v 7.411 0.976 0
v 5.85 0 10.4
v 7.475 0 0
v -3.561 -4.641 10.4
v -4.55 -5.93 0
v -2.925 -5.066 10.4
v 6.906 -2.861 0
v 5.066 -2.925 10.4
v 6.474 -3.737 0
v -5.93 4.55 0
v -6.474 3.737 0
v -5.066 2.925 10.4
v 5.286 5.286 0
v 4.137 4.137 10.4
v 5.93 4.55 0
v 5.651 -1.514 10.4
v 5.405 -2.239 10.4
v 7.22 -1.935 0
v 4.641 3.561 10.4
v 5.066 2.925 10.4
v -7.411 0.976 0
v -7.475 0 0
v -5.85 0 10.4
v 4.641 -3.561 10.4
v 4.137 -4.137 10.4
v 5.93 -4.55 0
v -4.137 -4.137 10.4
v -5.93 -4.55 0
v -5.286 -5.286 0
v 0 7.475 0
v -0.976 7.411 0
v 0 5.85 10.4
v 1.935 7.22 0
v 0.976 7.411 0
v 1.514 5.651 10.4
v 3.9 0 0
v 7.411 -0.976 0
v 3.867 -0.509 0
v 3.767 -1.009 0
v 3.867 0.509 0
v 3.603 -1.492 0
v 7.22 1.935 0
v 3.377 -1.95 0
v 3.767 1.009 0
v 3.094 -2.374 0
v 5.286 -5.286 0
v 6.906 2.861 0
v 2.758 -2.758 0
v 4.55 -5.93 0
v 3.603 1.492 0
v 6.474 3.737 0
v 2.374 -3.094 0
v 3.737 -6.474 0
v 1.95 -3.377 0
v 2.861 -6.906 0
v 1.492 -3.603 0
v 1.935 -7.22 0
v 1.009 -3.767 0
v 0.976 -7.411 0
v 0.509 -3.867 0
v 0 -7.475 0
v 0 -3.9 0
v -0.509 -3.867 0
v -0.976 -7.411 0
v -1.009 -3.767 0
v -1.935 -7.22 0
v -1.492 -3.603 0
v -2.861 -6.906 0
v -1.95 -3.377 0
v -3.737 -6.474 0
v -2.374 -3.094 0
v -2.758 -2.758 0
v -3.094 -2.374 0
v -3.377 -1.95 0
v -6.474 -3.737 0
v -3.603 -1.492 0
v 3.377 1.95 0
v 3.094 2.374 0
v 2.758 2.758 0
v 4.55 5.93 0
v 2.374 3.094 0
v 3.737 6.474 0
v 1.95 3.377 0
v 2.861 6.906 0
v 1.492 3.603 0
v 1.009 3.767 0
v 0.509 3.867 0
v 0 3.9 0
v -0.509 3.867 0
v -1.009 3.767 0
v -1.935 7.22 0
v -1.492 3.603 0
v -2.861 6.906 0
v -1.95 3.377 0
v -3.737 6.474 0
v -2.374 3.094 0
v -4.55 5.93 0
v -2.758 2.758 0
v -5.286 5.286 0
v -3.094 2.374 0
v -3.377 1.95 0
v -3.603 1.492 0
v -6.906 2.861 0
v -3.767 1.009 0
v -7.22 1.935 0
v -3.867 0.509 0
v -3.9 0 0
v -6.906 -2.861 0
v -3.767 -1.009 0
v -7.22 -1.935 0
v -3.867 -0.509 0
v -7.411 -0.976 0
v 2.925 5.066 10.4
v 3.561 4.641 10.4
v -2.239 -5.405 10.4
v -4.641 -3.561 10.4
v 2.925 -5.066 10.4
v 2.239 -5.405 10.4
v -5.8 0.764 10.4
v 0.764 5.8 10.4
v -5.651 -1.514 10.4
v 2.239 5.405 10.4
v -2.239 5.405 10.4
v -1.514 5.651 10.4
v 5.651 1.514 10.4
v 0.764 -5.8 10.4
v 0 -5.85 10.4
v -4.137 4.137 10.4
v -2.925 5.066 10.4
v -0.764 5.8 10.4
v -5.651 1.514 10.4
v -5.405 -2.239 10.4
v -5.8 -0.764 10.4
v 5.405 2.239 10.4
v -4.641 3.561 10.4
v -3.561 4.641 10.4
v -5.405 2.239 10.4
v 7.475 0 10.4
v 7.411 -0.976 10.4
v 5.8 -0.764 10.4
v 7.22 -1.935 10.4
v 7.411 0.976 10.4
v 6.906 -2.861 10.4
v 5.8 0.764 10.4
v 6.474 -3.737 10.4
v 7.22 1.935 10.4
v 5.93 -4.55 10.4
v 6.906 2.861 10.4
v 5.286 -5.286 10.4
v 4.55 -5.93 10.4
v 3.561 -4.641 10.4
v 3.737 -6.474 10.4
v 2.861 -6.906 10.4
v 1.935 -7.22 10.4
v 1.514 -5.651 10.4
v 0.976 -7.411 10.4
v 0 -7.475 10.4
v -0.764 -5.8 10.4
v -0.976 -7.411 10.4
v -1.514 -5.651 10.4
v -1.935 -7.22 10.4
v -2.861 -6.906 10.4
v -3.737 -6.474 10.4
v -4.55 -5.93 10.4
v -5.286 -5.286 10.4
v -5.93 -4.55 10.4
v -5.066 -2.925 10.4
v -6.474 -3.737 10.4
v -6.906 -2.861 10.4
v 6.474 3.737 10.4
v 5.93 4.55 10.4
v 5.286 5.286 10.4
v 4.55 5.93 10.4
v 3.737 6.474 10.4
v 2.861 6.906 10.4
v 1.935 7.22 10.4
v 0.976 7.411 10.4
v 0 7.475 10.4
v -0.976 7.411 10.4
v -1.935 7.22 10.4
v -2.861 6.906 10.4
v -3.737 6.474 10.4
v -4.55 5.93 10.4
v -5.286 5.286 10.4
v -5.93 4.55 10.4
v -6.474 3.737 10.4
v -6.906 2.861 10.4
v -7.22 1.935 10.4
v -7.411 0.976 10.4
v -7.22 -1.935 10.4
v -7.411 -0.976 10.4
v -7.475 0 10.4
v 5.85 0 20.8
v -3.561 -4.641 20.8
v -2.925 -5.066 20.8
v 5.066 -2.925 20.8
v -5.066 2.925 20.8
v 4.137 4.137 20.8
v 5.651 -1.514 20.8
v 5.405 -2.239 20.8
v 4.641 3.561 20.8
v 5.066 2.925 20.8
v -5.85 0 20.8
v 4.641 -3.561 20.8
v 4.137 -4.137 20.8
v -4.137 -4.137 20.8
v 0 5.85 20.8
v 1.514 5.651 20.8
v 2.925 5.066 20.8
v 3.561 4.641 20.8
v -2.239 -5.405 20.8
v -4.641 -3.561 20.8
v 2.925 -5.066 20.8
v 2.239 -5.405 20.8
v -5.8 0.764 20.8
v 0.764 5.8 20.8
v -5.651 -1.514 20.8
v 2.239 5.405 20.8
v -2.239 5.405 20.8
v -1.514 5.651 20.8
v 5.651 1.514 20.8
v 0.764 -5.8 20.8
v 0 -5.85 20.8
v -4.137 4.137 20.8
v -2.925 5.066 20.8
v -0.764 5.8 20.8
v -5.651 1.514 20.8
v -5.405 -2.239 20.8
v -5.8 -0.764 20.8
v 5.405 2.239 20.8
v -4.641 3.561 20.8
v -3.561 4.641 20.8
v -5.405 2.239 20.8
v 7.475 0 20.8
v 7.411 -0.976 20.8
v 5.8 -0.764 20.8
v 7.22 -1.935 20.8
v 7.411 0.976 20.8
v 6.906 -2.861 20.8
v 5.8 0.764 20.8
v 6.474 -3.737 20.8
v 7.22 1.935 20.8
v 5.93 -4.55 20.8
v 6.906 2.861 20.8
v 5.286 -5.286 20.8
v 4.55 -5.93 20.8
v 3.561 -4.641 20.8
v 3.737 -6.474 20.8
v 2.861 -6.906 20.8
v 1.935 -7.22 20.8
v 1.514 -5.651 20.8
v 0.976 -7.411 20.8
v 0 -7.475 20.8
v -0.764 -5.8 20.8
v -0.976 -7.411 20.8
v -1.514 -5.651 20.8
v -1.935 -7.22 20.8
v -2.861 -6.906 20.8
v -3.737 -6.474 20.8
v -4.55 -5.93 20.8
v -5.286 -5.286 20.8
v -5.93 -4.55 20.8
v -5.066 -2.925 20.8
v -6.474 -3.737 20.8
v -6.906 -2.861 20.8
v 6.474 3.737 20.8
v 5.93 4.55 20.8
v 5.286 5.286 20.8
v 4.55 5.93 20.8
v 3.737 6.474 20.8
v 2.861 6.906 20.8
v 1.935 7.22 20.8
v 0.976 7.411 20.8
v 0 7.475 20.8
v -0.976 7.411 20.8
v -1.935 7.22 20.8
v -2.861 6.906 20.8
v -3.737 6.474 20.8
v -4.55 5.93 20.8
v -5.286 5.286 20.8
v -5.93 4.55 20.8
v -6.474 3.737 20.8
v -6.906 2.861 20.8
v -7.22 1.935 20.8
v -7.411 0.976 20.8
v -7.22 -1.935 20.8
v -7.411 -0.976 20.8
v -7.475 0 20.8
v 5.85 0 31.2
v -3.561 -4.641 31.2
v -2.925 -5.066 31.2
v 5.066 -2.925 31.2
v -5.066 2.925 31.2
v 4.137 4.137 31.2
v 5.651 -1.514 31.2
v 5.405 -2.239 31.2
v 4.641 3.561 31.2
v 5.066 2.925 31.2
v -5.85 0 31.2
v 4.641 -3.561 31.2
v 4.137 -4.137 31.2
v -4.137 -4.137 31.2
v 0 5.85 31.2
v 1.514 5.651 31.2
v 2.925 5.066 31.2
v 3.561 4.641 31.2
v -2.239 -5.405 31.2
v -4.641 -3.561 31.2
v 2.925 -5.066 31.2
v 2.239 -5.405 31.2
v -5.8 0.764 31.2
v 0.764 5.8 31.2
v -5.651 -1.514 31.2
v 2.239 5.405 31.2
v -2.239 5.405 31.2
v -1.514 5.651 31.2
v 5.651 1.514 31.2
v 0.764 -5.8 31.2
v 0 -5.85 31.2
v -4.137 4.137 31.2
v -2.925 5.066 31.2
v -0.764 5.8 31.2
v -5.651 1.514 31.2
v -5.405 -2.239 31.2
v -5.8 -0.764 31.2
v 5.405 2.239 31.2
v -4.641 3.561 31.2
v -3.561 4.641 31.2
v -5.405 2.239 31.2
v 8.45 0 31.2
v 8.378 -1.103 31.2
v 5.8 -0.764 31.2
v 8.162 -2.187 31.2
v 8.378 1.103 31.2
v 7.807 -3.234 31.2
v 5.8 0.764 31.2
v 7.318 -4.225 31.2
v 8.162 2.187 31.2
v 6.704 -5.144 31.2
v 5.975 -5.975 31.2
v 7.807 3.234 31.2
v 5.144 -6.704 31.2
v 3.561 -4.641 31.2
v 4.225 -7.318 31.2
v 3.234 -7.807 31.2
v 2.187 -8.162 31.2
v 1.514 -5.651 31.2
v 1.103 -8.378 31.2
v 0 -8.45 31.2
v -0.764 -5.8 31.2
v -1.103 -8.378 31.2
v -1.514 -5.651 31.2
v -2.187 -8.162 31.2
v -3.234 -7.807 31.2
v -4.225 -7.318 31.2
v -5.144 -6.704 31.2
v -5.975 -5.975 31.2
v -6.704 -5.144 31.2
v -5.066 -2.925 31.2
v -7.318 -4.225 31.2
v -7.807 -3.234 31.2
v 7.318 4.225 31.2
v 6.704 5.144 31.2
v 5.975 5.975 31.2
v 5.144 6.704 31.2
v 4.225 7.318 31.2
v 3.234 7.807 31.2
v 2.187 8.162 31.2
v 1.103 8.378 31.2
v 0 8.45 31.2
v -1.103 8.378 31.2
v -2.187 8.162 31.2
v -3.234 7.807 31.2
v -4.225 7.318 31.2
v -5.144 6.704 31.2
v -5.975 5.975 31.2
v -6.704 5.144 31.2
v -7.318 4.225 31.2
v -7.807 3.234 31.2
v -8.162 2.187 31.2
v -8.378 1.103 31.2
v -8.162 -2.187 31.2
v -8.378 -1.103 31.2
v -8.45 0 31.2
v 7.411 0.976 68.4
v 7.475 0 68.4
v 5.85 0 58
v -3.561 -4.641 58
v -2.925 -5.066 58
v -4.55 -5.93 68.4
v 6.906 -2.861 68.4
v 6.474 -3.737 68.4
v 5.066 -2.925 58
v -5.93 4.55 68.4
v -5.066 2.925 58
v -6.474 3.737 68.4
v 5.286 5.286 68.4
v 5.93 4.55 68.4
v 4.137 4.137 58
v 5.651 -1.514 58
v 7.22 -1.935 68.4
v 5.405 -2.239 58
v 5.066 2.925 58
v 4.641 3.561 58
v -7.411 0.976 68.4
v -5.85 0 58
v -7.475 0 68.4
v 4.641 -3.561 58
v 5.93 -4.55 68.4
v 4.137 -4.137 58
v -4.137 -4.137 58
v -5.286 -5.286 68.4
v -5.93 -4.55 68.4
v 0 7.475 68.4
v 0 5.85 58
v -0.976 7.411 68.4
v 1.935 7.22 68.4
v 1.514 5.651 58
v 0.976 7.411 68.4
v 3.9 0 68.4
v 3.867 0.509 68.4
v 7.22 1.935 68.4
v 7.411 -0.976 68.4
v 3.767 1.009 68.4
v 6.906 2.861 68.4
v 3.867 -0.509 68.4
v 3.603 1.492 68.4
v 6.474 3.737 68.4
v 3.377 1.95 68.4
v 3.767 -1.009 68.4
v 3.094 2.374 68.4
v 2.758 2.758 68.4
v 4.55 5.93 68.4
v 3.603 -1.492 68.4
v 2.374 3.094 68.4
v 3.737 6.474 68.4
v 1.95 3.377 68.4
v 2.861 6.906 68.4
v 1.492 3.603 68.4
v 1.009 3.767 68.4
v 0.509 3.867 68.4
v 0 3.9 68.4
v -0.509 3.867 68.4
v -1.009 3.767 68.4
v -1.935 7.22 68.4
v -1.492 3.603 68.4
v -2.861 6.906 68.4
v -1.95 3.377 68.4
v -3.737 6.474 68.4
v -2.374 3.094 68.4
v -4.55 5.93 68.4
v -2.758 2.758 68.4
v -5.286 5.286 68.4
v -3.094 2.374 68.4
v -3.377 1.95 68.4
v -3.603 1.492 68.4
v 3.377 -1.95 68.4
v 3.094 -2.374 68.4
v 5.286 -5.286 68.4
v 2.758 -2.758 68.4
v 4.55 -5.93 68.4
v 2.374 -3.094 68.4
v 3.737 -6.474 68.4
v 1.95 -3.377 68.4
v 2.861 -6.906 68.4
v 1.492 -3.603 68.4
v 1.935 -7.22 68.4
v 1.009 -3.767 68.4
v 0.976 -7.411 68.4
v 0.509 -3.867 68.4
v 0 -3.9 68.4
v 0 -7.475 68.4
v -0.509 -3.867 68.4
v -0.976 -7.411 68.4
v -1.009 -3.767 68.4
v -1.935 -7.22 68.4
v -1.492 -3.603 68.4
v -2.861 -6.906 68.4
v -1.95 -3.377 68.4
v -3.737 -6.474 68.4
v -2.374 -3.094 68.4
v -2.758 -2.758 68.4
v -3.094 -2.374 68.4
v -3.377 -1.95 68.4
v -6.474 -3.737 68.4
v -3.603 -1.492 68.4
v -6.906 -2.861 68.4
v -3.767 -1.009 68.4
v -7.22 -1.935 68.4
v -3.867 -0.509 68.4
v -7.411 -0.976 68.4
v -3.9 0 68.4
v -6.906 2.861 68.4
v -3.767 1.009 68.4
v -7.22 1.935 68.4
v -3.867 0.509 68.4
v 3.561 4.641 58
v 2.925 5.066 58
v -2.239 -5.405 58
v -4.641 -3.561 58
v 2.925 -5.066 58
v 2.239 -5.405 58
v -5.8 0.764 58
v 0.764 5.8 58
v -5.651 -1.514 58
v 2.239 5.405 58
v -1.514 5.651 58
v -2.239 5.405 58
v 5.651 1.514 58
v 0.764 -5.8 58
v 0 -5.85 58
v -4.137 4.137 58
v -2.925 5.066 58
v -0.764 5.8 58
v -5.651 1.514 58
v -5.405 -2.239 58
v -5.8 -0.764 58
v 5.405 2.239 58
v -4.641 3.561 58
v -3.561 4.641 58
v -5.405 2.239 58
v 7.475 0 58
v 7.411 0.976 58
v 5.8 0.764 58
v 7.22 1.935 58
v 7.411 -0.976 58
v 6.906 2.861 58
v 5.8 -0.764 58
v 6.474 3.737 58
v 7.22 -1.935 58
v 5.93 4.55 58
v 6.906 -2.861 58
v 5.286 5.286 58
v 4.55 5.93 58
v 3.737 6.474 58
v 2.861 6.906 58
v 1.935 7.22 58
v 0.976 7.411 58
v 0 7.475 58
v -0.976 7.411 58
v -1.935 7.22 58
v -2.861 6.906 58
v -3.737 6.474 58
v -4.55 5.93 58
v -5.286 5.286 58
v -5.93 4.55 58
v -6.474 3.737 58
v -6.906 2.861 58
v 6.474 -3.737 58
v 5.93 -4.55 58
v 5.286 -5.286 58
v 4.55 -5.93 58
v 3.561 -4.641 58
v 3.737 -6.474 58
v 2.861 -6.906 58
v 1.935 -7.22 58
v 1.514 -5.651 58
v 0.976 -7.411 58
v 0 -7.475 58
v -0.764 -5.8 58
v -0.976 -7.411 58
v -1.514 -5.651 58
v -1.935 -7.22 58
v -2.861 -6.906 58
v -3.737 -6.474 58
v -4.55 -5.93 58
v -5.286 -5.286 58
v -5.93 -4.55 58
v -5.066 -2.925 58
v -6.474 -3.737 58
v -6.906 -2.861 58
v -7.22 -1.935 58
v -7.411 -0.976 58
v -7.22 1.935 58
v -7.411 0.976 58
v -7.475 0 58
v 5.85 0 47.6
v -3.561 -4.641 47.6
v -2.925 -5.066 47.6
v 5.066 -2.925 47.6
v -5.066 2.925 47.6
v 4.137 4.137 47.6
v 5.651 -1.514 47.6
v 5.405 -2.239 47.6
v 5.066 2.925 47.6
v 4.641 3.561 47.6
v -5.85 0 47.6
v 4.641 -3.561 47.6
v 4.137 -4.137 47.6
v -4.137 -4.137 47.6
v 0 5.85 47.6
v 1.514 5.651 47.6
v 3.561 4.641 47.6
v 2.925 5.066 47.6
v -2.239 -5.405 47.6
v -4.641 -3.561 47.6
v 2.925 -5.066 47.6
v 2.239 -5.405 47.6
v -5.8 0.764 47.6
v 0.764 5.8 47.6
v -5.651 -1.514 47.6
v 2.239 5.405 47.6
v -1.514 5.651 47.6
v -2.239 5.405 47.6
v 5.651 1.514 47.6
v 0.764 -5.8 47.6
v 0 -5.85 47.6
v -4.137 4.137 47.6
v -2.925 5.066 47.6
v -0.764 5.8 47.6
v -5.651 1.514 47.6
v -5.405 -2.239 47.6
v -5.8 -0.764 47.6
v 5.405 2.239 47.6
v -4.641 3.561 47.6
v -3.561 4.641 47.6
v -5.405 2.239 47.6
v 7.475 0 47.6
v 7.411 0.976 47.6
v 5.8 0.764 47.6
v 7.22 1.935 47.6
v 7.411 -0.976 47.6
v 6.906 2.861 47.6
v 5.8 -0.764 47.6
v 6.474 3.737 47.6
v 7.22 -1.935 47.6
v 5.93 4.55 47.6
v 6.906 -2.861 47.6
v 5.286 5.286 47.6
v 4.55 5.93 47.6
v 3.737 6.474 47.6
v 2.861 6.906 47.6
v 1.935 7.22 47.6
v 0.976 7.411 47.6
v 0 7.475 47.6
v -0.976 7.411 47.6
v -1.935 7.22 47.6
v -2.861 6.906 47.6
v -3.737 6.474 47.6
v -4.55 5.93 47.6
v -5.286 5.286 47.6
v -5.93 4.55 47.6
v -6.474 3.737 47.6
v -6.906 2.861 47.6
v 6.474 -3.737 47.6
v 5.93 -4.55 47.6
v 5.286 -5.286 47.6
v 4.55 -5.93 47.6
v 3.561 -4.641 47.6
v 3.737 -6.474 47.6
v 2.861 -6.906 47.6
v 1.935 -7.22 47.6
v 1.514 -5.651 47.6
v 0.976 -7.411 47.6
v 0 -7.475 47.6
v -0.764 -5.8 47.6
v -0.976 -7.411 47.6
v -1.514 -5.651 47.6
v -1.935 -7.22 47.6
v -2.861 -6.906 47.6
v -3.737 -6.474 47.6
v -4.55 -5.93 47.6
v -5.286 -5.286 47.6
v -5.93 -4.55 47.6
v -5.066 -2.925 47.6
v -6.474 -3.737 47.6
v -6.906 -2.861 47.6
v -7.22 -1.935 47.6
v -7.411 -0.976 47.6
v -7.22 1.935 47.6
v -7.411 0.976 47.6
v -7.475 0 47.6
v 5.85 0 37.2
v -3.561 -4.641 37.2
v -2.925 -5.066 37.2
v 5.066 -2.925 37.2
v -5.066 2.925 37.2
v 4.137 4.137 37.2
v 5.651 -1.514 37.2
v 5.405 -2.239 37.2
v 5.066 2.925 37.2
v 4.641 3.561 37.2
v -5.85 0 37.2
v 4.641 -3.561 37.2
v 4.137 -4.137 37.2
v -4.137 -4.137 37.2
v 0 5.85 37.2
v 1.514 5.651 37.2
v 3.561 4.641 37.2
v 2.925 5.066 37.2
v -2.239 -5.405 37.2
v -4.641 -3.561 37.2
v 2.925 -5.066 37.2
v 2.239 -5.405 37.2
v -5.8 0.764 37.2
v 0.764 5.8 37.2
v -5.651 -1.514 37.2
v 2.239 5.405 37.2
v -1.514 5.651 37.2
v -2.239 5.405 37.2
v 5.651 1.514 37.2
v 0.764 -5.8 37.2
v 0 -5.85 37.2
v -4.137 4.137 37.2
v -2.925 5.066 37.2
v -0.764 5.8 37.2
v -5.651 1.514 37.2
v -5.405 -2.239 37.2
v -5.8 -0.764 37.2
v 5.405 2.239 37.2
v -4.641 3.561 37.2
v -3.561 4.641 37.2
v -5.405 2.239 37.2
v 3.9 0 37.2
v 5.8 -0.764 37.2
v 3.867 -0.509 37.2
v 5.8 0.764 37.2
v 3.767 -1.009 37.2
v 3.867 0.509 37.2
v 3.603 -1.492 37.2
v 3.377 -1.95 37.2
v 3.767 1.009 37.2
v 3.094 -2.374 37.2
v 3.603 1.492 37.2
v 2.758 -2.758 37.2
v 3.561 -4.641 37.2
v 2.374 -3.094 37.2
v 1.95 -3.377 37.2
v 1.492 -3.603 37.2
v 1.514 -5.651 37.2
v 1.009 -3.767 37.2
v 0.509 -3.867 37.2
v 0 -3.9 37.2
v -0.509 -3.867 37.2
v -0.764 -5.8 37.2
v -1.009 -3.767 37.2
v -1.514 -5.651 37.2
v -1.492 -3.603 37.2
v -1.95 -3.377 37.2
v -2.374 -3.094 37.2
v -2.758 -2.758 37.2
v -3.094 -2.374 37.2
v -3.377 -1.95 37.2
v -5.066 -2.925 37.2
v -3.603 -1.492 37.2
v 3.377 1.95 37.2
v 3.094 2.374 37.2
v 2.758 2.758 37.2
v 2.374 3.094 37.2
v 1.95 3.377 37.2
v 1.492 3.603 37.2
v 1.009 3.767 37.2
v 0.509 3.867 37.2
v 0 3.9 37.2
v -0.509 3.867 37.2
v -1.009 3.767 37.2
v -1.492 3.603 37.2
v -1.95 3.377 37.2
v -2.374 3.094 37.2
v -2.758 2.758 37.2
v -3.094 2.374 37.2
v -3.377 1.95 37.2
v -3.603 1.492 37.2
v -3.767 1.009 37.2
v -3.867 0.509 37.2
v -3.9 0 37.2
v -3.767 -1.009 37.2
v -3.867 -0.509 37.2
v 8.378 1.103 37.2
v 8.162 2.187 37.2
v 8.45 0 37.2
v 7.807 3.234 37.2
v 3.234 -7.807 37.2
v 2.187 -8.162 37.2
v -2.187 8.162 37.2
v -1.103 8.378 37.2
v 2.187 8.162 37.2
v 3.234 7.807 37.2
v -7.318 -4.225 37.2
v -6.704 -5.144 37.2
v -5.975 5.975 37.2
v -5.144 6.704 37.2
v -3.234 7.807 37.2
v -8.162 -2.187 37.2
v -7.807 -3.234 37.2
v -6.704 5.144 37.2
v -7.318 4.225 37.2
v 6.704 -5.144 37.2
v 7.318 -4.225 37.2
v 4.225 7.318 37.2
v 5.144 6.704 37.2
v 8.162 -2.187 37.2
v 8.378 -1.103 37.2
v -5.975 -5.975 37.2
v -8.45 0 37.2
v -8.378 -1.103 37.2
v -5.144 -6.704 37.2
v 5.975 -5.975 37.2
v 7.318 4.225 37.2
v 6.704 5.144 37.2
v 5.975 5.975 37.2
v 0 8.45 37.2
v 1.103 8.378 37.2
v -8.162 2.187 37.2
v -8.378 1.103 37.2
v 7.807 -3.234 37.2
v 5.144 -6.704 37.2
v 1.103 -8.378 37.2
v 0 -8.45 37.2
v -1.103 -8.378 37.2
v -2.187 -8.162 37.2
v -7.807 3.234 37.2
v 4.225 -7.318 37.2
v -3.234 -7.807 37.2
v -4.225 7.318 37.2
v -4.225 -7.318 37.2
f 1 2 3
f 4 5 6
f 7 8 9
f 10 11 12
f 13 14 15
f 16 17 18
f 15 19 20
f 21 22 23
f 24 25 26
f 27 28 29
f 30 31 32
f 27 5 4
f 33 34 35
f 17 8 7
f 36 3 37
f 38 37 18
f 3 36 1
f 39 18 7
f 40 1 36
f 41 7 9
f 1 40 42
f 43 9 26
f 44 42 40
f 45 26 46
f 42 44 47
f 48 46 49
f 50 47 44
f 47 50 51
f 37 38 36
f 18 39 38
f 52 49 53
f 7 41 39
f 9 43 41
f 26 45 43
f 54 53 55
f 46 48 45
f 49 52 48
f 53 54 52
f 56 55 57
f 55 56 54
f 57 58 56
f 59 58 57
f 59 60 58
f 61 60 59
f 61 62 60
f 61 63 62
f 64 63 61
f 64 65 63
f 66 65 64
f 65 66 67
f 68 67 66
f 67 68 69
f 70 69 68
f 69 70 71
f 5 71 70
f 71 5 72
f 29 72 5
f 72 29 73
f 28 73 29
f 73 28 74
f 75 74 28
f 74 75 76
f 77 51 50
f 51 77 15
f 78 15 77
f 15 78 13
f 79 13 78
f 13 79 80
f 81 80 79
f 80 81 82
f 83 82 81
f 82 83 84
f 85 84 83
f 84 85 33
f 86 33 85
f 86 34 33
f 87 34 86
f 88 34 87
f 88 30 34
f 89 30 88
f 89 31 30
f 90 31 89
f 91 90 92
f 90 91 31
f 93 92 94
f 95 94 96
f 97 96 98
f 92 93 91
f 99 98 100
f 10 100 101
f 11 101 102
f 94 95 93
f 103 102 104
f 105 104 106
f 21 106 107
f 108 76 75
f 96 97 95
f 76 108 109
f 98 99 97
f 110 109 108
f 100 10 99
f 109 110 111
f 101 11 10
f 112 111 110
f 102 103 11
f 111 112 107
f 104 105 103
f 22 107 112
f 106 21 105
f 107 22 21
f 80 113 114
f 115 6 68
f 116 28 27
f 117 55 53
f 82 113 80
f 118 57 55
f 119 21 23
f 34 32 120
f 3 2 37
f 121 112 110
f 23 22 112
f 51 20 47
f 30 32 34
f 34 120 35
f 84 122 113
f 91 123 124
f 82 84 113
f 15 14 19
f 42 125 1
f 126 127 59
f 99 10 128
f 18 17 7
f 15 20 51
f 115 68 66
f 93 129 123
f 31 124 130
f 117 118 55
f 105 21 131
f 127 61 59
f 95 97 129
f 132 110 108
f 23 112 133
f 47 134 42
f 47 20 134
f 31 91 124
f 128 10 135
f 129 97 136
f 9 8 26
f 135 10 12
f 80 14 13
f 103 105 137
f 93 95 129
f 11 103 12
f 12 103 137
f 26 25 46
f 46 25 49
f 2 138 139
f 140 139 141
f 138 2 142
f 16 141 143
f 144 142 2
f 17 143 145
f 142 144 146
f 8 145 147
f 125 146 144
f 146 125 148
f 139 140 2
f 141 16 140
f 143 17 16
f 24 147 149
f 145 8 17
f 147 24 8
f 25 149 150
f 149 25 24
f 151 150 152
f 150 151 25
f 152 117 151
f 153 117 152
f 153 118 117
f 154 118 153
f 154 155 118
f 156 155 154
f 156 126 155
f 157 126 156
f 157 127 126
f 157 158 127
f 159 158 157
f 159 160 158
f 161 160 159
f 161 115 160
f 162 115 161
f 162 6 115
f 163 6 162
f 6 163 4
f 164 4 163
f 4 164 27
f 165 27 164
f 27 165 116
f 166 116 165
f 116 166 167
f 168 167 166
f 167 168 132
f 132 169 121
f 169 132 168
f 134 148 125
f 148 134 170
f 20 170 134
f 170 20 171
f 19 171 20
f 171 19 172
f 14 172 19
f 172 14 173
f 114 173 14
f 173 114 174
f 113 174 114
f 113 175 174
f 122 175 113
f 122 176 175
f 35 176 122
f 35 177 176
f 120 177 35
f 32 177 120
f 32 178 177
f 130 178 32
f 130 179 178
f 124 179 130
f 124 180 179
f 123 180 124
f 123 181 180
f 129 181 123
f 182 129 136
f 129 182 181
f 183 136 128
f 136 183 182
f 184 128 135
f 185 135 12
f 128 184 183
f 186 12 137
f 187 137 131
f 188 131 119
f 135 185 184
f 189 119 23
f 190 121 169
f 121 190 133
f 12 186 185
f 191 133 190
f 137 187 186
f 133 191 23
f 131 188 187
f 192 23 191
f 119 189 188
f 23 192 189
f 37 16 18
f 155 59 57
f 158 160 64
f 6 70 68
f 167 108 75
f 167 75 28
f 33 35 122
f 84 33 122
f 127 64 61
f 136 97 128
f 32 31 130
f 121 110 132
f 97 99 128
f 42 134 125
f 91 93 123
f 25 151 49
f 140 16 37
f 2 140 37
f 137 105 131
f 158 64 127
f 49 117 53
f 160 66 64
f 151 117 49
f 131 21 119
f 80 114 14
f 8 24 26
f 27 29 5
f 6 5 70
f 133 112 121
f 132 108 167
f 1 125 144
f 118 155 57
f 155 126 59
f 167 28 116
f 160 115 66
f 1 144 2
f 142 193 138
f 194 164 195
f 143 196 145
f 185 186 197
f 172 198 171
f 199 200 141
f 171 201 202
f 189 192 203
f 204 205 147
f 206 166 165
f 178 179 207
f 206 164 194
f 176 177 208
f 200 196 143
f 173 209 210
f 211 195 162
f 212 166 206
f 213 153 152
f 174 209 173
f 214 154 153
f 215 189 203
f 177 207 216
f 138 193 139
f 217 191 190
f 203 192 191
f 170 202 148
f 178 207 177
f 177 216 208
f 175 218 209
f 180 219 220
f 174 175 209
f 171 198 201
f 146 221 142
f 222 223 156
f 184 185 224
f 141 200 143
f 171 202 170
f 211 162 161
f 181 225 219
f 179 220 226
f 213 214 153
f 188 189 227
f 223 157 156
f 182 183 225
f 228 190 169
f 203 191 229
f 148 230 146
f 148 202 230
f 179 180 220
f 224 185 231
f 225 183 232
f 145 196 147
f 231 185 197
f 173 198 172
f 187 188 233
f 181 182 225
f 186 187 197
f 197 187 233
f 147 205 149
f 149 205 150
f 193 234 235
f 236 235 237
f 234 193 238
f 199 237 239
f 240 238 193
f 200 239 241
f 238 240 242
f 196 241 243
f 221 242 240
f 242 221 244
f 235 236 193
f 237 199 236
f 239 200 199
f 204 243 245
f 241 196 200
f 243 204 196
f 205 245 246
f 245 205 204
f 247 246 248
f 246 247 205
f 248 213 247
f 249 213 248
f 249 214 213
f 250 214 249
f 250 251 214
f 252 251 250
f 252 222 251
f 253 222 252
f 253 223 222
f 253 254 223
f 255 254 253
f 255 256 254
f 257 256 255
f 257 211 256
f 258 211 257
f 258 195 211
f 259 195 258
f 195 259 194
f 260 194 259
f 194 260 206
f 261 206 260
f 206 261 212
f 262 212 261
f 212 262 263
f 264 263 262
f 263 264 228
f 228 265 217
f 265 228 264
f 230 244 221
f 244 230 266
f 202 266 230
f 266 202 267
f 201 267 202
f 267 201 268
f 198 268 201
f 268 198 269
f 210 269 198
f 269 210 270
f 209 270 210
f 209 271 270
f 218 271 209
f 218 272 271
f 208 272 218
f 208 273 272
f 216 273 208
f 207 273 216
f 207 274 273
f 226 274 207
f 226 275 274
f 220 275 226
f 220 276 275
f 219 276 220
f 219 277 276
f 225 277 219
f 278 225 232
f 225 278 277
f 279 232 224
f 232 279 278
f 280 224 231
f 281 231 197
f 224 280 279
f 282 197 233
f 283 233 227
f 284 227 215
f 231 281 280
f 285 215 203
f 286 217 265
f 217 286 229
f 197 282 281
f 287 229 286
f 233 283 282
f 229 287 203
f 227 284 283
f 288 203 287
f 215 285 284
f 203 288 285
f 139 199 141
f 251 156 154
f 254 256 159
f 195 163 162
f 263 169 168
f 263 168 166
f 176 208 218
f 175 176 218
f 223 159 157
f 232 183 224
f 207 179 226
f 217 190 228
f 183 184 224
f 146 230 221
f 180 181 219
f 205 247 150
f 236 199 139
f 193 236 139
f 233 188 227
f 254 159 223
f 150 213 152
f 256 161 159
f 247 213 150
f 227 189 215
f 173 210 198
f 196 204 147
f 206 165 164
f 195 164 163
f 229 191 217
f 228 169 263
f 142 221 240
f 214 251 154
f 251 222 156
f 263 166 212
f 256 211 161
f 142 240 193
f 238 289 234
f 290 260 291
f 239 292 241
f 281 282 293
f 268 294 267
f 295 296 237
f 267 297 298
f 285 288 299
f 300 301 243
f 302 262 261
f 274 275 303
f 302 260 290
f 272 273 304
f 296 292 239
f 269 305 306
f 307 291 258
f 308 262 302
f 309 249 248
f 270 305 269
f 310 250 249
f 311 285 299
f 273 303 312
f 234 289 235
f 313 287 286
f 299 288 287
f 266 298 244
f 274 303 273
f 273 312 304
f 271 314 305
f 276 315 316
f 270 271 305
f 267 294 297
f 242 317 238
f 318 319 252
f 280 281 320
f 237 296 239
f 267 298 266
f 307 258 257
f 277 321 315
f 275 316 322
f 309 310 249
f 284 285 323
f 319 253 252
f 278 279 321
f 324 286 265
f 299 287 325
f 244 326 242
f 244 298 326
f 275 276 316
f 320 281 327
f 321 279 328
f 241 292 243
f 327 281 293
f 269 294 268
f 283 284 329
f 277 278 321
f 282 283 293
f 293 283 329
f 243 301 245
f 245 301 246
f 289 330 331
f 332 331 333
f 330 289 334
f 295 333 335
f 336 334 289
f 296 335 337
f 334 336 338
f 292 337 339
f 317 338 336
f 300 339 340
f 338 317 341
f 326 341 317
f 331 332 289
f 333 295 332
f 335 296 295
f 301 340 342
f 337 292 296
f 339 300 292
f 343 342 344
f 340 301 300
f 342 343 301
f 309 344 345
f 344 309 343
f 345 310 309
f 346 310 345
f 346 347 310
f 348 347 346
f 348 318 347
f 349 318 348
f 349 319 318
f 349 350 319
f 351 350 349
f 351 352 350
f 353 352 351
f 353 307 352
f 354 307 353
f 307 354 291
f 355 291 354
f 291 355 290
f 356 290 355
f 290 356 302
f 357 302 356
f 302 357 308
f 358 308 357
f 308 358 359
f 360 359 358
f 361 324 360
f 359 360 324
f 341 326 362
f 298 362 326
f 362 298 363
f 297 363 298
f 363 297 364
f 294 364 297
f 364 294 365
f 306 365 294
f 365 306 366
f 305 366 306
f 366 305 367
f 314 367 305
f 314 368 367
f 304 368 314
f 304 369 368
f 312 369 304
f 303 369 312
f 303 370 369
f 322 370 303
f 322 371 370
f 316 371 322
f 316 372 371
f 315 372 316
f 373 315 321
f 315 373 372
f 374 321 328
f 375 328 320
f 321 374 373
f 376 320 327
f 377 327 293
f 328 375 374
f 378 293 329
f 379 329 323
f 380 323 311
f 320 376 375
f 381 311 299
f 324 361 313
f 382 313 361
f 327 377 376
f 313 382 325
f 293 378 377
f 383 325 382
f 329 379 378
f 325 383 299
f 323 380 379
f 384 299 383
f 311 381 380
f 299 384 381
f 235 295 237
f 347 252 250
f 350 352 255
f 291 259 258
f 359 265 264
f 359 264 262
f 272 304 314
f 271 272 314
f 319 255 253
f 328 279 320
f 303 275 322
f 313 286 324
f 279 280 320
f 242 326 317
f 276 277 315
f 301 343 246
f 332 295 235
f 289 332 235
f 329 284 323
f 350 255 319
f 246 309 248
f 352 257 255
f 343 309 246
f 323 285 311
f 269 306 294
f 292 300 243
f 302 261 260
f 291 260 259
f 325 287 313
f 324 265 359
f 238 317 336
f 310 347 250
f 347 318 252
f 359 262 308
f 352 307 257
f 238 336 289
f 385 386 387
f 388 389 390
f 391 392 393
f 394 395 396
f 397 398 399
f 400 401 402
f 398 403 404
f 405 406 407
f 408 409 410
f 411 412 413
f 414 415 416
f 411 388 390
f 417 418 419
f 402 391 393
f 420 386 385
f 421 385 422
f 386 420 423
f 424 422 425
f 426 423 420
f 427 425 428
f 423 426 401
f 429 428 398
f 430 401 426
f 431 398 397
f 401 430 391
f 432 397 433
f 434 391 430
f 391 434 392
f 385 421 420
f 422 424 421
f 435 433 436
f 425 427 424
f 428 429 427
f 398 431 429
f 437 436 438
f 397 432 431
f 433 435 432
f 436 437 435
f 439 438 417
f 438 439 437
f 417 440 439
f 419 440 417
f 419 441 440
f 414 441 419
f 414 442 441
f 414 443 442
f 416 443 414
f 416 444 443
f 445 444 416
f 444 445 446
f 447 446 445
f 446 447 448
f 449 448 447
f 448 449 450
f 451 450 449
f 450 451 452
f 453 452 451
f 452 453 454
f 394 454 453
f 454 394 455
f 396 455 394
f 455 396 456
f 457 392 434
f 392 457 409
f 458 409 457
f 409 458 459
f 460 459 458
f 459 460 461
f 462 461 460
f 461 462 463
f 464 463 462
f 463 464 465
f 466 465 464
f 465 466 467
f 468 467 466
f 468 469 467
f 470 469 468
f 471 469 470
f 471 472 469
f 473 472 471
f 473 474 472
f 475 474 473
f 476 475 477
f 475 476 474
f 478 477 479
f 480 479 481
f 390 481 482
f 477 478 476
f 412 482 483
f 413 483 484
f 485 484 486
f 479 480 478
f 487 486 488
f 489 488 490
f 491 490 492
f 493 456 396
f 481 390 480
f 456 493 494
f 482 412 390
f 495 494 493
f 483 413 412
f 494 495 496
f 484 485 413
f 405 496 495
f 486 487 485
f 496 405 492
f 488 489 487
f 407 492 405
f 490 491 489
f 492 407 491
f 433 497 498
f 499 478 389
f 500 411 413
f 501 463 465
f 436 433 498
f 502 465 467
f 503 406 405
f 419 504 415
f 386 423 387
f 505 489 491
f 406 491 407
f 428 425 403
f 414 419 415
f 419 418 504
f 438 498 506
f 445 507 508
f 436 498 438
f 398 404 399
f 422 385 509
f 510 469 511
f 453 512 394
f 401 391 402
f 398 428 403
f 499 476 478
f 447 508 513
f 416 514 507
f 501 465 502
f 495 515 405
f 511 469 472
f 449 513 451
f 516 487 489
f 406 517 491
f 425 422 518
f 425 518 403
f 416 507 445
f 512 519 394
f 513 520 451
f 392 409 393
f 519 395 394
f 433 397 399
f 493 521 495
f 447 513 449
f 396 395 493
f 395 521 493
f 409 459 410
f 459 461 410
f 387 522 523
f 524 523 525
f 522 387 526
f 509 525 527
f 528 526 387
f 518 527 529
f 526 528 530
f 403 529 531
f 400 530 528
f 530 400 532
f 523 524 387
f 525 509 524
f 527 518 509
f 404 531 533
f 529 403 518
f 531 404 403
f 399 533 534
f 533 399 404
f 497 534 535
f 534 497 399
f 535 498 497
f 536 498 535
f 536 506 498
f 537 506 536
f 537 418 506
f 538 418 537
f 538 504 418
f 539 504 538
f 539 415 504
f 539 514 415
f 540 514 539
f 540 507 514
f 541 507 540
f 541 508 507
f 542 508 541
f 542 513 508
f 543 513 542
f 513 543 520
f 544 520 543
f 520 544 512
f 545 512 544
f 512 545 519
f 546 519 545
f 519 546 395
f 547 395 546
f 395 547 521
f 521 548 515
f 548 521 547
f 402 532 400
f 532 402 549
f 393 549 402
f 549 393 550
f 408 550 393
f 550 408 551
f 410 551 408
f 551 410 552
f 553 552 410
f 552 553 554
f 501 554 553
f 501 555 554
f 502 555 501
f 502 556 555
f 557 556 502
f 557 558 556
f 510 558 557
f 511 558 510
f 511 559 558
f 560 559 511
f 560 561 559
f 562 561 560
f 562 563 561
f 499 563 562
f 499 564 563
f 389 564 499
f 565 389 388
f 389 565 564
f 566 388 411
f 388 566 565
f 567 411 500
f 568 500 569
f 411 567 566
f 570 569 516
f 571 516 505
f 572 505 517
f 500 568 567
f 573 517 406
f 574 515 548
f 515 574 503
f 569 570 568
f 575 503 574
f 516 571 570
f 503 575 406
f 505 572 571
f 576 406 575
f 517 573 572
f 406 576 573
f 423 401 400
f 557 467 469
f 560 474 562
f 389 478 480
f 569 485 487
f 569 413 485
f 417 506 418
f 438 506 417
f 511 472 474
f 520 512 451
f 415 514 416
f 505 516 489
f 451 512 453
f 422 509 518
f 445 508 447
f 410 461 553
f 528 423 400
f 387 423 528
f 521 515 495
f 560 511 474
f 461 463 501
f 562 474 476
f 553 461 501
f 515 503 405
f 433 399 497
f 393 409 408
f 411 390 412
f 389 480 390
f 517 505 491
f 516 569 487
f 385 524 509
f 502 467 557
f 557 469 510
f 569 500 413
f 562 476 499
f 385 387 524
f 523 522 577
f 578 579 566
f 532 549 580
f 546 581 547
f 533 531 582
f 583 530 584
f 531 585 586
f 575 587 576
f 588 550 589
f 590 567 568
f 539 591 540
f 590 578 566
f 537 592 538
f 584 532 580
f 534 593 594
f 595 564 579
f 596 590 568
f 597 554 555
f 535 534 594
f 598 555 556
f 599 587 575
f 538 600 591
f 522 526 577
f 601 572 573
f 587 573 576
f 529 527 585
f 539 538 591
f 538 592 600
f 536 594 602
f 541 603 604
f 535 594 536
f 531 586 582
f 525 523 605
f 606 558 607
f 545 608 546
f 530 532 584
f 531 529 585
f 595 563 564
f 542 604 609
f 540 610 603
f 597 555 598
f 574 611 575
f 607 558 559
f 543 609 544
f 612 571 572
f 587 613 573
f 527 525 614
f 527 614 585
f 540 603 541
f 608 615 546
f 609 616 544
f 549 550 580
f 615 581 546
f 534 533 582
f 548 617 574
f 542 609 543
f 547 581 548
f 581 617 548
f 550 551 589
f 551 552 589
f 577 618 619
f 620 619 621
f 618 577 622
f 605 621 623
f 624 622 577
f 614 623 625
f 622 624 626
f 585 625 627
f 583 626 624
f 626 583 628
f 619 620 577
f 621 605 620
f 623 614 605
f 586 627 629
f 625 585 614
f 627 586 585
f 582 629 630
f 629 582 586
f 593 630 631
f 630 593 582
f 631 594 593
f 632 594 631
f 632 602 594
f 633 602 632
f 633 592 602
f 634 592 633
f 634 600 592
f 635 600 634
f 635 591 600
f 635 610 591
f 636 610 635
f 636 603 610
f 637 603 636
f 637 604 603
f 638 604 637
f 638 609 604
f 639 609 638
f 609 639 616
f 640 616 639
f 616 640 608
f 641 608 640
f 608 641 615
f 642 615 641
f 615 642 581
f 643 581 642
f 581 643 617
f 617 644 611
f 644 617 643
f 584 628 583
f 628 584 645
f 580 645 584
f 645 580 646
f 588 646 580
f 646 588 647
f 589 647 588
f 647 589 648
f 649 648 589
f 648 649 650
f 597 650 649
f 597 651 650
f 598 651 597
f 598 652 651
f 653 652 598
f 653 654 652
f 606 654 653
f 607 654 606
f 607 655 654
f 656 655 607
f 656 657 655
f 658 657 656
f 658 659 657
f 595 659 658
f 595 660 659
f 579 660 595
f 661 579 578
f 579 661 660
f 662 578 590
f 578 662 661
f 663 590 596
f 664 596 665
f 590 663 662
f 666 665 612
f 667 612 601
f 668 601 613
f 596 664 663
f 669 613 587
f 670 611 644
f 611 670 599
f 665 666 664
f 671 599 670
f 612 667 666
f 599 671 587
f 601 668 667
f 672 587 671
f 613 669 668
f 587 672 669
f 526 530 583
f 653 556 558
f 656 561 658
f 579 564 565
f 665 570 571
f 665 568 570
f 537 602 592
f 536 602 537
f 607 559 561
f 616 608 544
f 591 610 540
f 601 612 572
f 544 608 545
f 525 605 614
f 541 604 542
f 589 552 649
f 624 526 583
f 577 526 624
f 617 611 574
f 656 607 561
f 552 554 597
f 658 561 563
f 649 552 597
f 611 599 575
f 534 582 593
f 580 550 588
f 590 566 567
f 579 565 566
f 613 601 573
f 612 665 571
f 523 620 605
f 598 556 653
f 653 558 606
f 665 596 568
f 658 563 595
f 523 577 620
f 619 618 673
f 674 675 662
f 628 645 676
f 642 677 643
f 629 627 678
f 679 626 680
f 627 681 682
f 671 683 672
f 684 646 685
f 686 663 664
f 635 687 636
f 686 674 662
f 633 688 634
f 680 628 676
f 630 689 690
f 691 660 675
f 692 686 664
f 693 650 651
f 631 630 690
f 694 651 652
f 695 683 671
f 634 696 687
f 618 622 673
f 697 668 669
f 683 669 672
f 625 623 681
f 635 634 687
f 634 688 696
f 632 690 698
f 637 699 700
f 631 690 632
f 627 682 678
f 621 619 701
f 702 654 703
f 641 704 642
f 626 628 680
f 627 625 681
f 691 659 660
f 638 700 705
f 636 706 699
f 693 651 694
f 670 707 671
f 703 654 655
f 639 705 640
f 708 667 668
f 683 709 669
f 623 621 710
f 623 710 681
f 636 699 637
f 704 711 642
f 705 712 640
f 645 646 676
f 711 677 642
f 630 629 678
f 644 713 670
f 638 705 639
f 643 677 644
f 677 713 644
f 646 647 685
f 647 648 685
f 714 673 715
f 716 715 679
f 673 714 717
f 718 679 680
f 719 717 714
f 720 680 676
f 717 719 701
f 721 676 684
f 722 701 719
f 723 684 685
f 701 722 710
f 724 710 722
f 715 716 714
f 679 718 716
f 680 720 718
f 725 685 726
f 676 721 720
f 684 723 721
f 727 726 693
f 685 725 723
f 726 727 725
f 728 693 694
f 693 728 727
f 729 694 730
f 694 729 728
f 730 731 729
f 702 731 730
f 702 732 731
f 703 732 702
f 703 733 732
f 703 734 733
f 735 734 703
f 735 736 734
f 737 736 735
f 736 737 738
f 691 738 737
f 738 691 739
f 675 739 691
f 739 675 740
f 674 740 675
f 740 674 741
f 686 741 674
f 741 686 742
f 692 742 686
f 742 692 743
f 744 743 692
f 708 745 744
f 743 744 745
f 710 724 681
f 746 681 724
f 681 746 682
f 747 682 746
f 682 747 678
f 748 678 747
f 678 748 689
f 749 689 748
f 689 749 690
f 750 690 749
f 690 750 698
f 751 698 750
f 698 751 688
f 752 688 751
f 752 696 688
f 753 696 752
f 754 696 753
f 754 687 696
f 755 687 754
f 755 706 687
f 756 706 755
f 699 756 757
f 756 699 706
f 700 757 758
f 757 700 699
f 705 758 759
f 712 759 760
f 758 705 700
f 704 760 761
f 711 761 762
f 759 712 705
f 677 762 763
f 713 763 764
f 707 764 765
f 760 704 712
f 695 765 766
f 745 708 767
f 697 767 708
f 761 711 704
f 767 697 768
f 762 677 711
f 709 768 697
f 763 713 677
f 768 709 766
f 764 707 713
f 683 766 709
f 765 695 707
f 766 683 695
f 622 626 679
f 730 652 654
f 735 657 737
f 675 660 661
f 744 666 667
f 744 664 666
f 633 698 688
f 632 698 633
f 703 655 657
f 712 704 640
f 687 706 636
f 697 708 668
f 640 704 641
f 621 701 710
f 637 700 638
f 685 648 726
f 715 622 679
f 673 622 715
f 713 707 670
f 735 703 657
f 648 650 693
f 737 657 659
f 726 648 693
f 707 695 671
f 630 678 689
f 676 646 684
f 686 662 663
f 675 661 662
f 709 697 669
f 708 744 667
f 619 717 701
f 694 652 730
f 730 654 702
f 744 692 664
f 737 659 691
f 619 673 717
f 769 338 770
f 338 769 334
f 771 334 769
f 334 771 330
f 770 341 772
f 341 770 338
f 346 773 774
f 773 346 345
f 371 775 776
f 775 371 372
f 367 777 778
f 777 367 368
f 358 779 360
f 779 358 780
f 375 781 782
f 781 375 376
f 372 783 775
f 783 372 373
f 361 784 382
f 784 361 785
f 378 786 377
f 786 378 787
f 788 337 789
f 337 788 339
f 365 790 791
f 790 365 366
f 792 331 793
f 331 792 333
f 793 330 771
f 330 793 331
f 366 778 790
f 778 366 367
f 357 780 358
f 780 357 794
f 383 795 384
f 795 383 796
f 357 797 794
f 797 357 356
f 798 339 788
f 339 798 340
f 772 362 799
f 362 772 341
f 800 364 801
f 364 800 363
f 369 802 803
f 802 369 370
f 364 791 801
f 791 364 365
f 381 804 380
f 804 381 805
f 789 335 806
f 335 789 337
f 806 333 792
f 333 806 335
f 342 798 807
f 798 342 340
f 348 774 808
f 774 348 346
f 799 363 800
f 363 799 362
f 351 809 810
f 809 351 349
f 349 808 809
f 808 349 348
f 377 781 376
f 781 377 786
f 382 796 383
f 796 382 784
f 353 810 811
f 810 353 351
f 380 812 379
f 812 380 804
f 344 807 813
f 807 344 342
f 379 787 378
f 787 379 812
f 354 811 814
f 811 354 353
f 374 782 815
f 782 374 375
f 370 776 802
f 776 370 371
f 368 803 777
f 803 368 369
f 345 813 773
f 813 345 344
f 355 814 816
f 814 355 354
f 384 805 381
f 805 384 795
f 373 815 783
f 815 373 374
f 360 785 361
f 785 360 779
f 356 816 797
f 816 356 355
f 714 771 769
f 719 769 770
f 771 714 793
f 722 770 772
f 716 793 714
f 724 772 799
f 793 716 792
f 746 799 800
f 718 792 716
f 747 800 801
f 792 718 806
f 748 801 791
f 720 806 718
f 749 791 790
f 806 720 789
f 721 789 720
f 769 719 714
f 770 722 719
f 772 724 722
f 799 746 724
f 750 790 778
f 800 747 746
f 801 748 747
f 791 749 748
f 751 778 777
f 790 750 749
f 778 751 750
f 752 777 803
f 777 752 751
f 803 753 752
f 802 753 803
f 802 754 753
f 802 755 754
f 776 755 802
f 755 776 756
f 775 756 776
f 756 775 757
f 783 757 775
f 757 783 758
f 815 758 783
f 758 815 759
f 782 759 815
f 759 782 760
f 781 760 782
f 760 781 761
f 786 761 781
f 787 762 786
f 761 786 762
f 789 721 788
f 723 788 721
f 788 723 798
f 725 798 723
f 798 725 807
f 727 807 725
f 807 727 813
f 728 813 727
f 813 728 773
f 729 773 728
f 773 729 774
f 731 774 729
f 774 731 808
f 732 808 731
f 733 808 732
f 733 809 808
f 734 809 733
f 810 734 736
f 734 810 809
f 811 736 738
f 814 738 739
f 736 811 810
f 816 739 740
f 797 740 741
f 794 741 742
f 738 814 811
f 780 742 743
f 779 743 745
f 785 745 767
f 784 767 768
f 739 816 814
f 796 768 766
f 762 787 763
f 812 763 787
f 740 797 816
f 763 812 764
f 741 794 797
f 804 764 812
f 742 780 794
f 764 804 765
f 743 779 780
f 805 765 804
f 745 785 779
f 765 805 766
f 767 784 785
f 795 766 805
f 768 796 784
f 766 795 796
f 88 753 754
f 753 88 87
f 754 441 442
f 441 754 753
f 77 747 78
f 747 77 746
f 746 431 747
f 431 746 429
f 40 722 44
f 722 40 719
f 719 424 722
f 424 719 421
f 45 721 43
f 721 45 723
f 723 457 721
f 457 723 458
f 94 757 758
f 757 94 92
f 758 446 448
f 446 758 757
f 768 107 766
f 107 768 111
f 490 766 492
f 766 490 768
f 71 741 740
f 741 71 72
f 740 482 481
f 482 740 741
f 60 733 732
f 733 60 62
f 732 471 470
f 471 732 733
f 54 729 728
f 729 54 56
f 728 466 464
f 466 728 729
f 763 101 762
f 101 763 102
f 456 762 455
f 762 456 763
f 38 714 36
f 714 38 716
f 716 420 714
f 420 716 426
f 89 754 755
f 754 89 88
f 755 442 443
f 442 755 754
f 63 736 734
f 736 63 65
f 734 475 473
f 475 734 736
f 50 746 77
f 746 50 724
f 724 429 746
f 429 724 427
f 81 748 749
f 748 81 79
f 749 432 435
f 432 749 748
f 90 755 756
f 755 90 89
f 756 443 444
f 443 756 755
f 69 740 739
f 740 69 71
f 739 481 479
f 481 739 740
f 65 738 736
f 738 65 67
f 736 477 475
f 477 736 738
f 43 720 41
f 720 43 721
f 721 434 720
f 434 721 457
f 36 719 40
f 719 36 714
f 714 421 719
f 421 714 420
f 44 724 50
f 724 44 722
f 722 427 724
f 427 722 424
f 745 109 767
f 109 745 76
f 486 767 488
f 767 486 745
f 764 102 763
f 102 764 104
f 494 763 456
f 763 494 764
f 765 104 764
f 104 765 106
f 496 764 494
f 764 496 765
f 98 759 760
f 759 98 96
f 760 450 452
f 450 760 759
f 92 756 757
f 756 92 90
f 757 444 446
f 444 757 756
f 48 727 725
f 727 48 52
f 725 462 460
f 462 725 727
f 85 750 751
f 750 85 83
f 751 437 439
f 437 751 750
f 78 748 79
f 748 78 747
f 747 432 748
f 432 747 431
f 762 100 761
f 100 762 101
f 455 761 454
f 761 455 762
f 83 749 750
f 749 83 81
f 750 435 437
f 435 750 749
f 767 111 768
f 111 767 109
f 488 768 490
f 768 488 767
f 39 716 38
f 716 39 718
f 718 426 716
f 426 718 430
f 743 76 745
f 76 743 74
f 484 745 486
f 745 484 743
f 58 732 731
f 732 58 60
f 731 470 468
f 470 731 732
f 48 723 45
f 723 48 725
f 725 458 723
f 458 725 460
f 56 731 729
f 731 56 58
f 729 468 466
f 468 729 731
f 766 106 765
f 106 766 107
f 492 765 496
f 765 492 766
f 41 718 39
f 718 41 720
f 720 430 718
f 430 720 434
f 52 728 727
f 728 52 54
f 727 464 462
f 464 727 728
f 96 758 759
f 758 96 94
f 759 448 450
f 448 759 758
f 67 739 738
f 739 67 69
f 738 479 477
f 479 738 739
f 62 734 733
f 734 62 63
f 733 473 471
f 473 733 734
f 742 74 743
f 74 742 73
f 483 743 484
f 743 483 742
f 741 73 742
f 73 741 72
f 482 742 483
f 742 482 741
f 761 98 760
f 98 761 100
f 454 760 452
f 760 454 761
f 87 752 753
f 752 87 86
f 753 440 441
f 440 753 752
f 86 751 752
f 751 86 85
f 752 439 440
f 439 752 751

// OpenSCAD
// @title Hose Barb Connectors
// @category Water
// @material PETG or ABS, 100% infill
// @print Straight: upright. Tee: on its side with supports off (small overhangs).
// @summary Join or split flexible tubing for gravity water systems, rain-catchment, siphons and drip irrigation.
// @use Warm the tubing in hot water, push it over all three barbs, secure with wire or a hose clamp. Low pressure only (gravity / siphon).
// @variant 10mm straight | -D id=10 -D part="straight"
// @variant 13mm (1/2in) straight | -D id=13 -D part="straight"
// @variant 10mm tee | -D id=10 -D part="tee"
// @variant 13mm (1/2in) tee | -D id=13 -D part="tee"

id = 13; part = "straight";
$fn = 48;
bore = id*0.6;
module barbs() {
  for (i=[0:2]) translate([0,0,i*id*0.8]) cylinder(d1=id*1.15, d2=id*0.9, h=id*0.8);
}
module leg() { union() { barbs(); } }
if (part == "straight") {
  difference() {
    union() {
      leg();
      translate([0,0,id*2.4]) cylinder(d=id*1.3, h=6);
      translate([0,0,id*4.8+6]) mirror([0,0,1]) leg();
    }
    translate([0,0,-1]) cylinder(d=bore, h=id*5+10);
  }
} else {
  L = id*2.4;
  difference() {
    union() {
      translate([0,0,0]) leg();
      translate([0,0,L]) cylinder(d=id*1.3, h=id*1.4);
      translate([0,0,L+id*1.4+L]) mirror([0,0,1]) leg();
      translate([0,0,L+id*0.7]) rotate([0,90,0]) union() { cylinder(d=id*1.1, h=id*0.8); translate([0,0,id*0.6]) leg(); }
    }
    translate([0,0,-1]) cylinder(d=bore, h=2*L+id*1.4+2);
    translate([0,0,L+id*0.7]) rotate([0,90,0]) cylinder(d=bore, h=L+id);
  }
}
